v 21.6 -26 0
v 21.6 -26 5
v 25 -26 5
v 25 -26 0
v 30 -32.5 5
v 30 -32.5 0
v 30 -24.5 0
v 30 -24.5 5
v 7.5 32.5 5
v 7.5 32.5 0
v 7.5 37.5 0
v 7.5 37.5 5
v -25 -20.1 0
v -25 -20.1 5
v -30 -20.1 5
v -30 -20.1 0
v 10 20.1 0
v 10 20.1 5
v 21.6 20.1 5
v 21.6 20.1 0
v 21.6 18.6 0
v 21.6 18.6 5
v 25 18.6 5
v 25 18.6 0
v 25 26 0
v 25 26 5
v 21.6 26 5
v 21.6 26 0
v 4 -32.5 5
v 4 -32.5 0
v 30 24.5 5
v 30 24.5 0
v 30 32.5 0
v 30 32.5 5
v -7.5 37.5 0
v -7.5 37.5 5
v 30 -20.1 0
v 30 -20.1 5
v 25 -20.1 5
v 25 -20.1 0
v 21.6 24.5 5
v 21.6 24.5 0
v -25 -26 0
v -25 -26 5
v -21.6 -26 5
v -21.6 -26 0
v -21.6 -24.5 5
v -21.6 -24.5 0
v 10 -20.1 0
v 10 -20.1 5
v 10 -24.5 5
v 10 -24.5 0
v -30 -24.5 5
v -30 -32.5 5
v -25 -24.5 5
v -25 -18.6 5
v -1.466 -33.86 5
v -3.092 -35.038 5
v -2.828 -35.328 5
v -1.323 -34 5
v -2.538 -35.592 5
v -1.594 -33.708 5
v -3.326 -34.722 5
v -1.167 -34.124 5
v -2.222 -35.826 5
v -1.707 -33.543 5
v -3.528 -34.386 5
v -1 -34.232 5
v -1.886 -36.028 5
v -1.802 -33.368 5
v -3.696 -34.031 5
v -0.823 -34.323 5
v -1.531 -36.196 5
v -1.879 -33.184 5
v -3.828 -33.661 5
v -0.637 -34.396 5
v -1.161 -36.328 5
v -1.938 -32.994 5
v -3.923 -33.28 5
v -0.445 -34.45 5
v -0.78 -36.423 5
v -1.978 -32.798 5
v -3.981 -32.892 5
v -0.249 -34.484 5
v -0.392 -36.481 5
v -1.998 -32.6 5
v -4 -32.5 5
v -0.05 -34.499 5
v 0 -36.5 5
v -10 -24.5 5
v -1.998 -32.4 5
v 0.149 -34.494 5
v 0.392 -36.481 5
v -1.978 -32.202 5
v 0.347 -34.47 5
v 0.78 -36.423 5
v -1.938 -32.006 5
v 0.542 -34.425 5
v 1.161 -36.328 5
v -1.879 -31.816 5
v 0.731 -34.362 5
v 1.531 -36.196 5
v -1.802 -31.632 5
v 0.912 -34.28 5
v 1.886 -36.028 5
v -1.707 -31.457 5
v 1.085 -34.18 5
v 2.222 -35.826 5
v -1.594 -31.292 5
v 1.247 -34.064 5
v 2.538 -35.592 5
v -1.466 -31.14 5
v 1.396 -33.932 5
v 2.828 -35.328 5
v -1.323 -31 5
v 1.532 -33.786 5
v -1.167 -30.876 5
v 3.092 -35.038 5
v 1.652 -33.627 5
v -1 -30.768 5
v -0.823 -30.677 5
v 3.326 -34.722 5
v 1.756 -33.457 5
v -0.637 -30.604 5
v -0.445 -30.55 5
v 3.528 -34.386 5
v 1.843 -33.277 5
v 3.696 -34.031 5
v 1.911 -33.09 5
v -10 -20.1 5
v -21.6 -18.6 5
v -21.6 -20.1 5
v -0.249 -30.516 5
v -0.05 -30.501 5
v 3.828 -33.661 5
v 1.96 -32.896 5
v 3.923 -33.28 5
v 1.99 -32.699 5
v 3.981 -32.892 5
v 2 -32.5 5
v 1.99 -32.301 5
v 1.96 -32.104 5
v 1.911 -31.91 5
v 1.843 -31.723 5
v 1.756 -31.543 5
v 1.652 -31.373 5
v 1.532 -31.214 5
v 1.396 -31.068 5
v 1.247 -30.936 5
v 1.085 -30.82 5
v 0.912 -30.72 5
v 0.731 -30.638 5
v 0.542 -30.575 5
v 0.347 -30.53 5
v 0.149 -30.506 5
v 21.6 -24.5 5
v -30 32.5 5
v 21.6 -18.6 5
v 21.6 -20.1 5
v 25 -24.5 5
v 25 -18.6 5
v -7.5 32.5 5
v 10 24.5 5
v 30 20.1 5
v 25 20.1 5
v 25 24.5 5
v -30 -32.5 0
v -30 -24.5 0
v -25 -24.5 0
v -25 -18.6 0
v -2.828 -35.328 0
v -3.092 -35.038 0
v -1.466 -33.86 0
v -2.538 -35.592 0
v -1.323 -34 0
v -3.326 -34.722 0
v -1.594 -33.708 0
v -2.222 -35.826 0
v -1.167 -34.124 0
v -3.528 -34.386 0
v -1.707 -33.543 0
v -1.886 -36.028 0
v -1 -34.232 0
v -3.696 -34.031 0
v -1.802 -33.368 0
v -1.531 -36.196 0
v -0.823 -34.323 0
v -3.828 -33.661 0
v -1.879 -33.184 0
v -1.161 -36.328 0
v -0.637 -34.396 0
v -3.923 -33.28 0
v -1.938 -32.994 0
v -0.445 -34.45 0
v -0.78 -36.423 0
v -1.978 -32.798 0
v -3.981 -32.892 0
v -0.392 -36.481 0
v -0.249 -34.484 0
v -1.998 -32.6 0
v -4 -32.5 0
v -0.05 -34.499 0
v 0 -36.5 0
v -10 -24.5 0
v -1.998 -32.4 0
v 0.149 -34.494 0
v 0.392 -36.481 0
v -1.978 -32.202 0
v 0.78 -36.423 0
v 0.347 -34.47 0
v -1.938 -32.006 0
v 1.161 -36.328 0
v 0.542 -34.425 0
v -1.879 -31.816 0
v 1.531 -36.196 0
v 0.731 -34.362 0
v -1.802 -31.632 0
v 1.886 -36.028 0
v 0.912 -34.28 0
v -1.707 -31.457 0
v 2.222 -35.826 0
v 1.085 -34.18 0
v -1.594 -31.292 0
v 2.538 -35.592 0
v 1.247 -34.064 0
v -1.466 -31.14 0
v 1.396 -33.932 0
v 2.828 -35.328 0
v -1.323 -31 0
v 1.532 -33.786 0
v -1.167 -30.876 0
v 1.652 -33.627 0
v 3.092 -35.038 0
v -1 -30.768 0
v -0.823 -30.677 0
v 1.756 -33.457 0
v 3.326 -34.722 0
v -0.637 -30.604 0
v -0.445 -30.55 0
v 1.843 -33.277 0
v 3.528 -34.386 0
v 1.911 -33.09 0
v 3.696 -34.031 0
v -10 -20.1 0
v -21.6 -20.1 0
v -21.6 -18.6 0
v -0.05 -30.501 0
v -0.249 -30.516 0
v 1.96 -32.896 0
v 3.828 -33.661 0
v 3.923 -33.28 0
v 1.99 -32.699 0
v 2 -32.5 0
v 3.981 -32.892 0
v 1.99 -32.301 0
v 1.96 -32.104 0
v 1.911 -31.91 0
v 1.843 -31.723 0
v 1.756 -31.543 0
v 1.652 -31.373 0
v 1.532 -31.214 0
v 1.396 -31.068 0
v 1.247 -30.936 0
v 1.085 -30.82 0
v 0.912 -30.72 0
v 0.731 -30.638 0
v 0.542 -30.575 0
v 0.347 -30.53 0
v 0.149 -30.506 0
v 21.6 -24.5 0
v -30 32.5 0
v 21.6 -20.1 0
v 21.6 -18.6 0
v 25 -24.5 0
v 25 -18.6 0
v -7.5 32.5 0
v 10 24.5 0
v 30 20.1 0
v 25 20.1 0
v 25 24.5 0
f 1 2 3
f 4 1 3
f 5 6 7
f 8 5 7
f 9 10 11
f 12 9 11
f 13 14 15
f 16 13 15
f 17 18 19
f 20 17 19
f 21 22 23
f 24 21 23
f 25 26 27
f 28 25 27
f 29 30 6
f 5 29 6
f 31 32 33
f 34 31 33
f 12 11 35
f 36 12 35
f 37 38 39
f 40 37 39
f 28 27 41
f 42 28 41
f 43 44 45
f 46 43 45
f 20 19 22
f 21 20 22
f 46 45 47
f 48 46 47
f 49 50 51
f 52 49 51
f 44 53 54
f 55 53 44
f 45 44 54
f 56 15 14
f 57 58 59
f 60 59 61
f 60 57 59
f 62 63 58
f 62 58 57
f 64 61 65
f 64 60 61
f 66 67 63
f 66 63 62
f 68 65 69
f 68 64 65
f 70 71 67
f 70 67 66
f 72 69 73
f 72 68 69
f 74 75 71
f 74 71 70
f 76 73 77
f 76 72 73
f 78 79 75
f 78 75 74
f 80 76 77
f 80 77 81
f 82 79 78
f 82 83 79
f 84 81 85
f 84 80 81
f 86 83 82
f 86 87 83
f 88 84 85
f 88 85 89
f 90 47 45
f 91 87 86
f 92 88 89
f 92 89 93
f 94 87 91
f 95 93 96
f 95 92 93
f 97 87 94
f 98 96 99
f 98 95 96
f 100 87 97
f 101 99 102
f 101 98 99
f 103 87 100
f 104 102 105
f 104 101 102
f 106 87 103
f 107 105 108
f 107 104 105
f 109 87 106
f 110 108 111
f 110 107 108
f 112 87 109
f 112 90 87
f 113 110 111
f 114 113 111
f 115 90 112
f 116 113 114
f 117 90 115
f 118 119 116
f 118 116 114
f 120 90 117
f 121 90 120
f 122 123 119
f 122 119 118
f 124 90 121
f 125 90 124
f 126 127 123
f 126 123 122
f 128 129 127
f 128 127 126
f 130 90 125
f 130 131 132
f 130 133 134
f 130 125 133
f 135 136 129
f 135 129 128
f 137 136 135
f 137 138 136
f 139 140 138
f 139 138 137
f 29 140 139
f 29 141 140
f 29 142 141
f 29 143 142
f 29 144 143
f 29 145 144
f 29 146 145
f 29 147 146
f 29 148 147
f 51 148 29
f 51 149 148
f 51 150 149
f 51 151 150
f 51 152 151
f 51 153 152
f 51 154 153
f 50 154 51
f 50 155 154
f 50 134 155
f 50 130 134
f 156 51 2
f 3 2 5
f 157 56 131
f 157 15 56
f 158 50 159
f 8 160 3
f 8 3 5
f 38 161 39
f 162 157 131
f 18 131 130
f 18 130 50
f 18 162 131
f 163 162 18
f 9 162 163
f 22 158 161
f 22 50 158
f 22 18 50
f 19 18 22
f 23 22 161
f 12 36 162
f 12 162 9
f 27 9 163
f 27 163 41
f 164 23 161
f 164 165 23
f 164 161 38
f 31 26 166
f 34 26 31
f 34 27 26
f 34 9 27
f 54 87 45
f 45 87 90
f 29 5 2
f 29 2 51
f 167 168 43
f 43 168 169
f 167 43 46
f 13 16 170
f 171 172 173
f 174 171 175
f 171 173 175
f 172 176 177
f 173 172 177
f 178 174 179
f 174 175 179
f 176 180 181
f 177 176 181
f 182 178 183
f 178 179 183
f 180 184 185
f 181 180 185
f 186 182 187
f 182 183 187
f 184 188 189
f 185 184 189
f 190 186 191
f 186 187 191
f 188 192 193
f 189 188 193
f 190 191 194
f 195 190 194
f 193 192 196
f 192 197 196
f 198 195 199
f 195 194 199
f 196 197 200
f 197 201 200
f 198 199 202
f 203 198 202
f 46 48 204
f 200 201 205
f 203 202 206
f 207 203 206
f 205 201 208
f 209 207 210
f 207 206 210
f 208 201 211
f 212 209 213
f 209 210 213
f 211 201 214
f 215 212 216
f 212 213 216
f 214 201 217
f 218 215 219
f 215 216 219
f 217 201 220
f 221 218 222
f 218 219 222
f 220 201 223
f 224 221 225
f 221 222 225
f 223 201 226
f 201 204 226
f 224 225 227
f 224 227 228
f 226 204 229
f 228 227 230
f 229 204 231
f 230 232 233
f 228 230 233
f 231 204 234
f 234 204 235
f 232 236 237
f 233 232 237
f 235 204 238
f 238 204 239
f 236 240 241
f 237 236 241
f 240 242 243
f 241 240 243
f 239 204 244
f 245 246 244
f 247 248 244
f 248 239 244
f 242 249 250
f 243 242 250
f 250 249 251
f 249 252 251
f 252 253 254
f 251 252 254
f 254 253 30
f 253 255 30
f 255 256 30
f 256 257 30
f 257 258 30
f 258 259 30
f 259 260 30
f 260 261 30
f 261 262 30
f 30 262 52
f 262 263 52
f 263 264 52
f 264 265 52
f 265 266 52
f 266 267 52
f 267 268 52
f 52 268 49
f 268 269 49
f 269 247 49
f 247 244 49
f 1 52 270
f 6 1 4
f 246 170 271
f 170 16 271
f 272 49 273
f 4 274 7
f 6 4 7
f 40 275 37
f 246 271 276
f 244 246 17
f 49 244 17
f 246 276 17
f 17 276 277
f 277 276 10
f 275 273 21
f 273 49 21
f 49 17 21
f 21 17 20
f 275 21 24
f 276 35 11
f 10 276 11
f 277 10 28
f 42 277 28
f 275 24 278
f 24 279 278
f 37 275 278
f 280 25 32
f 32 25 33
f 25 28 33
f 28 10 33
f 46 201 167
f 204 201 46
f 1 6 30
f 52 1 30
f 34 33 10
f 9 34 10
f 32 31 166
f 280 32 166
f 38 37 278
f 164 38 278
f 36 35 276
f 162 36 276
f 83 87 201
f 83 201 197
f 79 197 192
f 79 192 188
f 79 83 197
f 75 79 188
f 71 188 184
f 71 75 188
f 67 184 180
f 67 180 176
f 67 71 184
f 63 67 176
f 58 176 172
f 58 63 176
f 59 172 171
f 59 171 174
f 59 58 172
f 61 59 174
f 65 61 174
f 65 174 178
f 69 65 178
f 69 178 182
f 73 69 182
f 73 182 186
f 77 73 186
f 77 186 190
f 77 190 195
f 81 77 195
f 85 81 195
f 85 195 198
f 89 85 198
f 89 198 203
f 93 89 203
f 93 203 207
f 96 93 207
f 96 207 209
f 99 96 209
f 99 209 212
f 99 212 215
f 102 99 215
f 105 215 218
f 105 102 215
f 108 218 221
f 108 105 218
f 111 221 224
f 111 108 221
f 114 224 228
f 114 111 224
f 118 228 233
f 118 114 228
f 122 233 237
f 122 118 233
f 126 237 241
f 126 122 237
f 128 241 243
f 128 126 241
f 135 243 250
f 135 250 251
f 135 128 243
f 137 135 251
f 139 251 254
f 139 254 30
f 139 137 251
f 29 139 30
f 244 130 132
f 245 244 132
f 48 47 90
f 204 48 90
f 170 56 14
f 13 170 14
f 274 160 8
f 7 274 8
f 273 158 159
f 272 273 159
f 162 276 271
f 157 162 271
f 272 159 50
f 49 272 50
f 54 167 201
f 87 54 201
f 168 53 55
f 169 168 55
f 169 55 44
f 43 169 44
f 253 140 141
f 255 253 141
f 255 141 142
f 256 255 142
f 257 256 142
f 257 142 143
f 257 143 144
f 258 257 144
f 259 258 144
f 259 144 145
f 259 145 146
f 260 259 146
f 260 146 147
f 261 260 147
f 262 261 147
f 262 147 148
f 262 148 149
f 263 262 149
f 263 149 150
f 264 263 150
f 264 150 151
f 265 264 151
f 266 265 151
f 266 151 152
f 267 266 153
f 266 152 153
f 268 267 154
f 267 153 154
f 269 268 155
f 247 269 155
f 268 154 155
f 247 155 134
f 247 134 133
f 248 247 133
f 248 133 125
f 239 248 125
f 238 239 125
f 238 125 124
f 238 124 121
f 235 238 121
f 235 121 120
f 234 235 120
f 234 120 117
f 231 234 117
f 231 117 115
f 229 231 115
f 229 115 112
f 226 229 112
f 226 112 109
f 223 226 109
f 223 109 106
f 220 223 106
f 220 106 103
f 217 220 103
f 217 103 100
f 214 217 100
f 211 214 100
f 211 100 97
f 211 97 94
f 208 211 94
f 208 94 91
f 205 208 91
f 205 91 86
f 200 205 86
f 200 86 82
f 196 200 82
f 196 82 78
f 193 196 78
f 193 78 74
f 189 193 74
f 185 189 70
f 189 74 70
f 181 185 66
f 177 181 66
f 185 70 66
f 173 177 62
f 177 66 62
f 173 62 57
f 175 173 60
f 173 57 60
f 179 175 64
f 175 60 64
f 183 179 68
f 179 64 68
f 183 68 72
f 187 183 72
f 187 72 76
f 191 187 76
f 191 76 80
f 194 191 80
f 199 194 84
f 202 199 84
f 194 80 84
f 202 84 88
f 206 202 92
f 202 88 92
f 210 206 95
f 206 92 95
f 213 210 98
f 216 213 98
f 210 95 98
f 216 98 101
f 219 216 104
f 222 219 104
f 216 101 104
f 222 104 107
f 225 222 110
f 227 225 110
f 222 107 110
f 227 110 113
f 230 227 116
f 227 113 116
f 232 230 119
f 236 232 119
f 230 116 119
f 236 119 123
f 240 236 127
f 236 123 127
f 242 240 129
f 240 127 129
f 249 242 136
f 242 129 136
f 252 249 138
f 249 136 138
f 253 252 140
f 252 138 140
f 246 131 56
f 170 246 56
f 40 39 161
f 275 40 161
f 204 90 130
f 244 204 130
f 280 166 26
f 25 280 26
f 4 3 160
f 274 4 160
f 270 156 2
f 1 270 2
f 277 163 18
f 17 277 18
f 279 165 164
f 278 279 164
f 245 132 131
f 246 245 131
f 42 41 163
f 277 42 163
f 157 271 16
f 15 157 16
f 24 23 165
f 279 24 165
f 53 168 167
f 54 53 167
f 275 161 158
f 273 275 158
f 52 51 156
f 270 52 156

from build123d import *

# Parameters (mm, degrees)
BOSS_EXTRUDE1_DEPTH = 5
CUT_EXTRUDE1_DEPTH  = 5
SKETCH5_R           = 4
SKETCH5_R_2         = 2
BOSS_EXTRUDE2_DEPTH = 5
SKETCH6_R           = 2
CUT_EXTRUDE2_DEPTH  = 5


with BuildPart() as part:
    # Sketch1 → Boss-Extrude1 (new body)
    with BuildSketch(Plane.XY):
        Polygon((7.5, 32.5), (7.5, 37.5), (-7.5, 37.5), (-7.5, 32.5), (-30, 32.5), (-30, -32.5), (30, -32.5), (30, 32.5), align=None)
    extrude(amount=BOSS_EXTRUDE1_DEPTH)

    # Sketch3 → Cut-Extrude1 (cut)
    with BuildSketch(Plane.XY.offset(5)):
        Polygon((30, 24.5), (25, 24.5), (25, 26), (21.6, 26), (21.6, 24.5), (10, 24.5), (10, 20.1), (21.6, 20.1), (21.6, 18.6), (25, 18.6), (25, 20.1), (30, 20.1), align=None)
        Polygon((30, -24.5), (30, -20.1), (25, -20.1), (25, -18.6), (21.6, -18.6), (21.6, -20.1), (10, -20.1), (10, -24.5), (21.6, -24.5), (21.6, -26), (25, -26), (25, -24.5), align=None)
        Polygon((-30, -24.5), (-25, -24.5), (-25, -26), (-21.6, -26), (-21.6, -24.5), (-10, -24.5), (-10, -20.1), (-21.6, -20.1), (-21.6, -18.6), (-25, -18.6), (-25, -20.1), (-30, -20.1), align=None)
    extrude(amount=-CUT_EXTRUDE1_DEPTH, mode=Mode.SUBTRACT)

    # Sketch5 → Boss-Extrude2 (add)
    with BuildSketch(Plane.XY.offset(5)):
        with Locations((0, -32.5)):
            Circle(SKETCH5_R)
        with Locations((0, -32.5)):
            Circle(SKETCH5_R_2, mode=Mode.SUBTRACT)
    extrude(amount=-BOSS_EXTRUDE2_DEPTH)

    # Sketch6 → Cut-Extrude2 (cut)
    with BuildSketch(Plane.XY.offset(5)):
        with Locations((0, -32.5)):
            Circle(SKETCH6_R)
    extrude(amount=-CUT_EXTRUDE2_DEPTH, mode=Mode.SUBTRACT)


solid = part.part
